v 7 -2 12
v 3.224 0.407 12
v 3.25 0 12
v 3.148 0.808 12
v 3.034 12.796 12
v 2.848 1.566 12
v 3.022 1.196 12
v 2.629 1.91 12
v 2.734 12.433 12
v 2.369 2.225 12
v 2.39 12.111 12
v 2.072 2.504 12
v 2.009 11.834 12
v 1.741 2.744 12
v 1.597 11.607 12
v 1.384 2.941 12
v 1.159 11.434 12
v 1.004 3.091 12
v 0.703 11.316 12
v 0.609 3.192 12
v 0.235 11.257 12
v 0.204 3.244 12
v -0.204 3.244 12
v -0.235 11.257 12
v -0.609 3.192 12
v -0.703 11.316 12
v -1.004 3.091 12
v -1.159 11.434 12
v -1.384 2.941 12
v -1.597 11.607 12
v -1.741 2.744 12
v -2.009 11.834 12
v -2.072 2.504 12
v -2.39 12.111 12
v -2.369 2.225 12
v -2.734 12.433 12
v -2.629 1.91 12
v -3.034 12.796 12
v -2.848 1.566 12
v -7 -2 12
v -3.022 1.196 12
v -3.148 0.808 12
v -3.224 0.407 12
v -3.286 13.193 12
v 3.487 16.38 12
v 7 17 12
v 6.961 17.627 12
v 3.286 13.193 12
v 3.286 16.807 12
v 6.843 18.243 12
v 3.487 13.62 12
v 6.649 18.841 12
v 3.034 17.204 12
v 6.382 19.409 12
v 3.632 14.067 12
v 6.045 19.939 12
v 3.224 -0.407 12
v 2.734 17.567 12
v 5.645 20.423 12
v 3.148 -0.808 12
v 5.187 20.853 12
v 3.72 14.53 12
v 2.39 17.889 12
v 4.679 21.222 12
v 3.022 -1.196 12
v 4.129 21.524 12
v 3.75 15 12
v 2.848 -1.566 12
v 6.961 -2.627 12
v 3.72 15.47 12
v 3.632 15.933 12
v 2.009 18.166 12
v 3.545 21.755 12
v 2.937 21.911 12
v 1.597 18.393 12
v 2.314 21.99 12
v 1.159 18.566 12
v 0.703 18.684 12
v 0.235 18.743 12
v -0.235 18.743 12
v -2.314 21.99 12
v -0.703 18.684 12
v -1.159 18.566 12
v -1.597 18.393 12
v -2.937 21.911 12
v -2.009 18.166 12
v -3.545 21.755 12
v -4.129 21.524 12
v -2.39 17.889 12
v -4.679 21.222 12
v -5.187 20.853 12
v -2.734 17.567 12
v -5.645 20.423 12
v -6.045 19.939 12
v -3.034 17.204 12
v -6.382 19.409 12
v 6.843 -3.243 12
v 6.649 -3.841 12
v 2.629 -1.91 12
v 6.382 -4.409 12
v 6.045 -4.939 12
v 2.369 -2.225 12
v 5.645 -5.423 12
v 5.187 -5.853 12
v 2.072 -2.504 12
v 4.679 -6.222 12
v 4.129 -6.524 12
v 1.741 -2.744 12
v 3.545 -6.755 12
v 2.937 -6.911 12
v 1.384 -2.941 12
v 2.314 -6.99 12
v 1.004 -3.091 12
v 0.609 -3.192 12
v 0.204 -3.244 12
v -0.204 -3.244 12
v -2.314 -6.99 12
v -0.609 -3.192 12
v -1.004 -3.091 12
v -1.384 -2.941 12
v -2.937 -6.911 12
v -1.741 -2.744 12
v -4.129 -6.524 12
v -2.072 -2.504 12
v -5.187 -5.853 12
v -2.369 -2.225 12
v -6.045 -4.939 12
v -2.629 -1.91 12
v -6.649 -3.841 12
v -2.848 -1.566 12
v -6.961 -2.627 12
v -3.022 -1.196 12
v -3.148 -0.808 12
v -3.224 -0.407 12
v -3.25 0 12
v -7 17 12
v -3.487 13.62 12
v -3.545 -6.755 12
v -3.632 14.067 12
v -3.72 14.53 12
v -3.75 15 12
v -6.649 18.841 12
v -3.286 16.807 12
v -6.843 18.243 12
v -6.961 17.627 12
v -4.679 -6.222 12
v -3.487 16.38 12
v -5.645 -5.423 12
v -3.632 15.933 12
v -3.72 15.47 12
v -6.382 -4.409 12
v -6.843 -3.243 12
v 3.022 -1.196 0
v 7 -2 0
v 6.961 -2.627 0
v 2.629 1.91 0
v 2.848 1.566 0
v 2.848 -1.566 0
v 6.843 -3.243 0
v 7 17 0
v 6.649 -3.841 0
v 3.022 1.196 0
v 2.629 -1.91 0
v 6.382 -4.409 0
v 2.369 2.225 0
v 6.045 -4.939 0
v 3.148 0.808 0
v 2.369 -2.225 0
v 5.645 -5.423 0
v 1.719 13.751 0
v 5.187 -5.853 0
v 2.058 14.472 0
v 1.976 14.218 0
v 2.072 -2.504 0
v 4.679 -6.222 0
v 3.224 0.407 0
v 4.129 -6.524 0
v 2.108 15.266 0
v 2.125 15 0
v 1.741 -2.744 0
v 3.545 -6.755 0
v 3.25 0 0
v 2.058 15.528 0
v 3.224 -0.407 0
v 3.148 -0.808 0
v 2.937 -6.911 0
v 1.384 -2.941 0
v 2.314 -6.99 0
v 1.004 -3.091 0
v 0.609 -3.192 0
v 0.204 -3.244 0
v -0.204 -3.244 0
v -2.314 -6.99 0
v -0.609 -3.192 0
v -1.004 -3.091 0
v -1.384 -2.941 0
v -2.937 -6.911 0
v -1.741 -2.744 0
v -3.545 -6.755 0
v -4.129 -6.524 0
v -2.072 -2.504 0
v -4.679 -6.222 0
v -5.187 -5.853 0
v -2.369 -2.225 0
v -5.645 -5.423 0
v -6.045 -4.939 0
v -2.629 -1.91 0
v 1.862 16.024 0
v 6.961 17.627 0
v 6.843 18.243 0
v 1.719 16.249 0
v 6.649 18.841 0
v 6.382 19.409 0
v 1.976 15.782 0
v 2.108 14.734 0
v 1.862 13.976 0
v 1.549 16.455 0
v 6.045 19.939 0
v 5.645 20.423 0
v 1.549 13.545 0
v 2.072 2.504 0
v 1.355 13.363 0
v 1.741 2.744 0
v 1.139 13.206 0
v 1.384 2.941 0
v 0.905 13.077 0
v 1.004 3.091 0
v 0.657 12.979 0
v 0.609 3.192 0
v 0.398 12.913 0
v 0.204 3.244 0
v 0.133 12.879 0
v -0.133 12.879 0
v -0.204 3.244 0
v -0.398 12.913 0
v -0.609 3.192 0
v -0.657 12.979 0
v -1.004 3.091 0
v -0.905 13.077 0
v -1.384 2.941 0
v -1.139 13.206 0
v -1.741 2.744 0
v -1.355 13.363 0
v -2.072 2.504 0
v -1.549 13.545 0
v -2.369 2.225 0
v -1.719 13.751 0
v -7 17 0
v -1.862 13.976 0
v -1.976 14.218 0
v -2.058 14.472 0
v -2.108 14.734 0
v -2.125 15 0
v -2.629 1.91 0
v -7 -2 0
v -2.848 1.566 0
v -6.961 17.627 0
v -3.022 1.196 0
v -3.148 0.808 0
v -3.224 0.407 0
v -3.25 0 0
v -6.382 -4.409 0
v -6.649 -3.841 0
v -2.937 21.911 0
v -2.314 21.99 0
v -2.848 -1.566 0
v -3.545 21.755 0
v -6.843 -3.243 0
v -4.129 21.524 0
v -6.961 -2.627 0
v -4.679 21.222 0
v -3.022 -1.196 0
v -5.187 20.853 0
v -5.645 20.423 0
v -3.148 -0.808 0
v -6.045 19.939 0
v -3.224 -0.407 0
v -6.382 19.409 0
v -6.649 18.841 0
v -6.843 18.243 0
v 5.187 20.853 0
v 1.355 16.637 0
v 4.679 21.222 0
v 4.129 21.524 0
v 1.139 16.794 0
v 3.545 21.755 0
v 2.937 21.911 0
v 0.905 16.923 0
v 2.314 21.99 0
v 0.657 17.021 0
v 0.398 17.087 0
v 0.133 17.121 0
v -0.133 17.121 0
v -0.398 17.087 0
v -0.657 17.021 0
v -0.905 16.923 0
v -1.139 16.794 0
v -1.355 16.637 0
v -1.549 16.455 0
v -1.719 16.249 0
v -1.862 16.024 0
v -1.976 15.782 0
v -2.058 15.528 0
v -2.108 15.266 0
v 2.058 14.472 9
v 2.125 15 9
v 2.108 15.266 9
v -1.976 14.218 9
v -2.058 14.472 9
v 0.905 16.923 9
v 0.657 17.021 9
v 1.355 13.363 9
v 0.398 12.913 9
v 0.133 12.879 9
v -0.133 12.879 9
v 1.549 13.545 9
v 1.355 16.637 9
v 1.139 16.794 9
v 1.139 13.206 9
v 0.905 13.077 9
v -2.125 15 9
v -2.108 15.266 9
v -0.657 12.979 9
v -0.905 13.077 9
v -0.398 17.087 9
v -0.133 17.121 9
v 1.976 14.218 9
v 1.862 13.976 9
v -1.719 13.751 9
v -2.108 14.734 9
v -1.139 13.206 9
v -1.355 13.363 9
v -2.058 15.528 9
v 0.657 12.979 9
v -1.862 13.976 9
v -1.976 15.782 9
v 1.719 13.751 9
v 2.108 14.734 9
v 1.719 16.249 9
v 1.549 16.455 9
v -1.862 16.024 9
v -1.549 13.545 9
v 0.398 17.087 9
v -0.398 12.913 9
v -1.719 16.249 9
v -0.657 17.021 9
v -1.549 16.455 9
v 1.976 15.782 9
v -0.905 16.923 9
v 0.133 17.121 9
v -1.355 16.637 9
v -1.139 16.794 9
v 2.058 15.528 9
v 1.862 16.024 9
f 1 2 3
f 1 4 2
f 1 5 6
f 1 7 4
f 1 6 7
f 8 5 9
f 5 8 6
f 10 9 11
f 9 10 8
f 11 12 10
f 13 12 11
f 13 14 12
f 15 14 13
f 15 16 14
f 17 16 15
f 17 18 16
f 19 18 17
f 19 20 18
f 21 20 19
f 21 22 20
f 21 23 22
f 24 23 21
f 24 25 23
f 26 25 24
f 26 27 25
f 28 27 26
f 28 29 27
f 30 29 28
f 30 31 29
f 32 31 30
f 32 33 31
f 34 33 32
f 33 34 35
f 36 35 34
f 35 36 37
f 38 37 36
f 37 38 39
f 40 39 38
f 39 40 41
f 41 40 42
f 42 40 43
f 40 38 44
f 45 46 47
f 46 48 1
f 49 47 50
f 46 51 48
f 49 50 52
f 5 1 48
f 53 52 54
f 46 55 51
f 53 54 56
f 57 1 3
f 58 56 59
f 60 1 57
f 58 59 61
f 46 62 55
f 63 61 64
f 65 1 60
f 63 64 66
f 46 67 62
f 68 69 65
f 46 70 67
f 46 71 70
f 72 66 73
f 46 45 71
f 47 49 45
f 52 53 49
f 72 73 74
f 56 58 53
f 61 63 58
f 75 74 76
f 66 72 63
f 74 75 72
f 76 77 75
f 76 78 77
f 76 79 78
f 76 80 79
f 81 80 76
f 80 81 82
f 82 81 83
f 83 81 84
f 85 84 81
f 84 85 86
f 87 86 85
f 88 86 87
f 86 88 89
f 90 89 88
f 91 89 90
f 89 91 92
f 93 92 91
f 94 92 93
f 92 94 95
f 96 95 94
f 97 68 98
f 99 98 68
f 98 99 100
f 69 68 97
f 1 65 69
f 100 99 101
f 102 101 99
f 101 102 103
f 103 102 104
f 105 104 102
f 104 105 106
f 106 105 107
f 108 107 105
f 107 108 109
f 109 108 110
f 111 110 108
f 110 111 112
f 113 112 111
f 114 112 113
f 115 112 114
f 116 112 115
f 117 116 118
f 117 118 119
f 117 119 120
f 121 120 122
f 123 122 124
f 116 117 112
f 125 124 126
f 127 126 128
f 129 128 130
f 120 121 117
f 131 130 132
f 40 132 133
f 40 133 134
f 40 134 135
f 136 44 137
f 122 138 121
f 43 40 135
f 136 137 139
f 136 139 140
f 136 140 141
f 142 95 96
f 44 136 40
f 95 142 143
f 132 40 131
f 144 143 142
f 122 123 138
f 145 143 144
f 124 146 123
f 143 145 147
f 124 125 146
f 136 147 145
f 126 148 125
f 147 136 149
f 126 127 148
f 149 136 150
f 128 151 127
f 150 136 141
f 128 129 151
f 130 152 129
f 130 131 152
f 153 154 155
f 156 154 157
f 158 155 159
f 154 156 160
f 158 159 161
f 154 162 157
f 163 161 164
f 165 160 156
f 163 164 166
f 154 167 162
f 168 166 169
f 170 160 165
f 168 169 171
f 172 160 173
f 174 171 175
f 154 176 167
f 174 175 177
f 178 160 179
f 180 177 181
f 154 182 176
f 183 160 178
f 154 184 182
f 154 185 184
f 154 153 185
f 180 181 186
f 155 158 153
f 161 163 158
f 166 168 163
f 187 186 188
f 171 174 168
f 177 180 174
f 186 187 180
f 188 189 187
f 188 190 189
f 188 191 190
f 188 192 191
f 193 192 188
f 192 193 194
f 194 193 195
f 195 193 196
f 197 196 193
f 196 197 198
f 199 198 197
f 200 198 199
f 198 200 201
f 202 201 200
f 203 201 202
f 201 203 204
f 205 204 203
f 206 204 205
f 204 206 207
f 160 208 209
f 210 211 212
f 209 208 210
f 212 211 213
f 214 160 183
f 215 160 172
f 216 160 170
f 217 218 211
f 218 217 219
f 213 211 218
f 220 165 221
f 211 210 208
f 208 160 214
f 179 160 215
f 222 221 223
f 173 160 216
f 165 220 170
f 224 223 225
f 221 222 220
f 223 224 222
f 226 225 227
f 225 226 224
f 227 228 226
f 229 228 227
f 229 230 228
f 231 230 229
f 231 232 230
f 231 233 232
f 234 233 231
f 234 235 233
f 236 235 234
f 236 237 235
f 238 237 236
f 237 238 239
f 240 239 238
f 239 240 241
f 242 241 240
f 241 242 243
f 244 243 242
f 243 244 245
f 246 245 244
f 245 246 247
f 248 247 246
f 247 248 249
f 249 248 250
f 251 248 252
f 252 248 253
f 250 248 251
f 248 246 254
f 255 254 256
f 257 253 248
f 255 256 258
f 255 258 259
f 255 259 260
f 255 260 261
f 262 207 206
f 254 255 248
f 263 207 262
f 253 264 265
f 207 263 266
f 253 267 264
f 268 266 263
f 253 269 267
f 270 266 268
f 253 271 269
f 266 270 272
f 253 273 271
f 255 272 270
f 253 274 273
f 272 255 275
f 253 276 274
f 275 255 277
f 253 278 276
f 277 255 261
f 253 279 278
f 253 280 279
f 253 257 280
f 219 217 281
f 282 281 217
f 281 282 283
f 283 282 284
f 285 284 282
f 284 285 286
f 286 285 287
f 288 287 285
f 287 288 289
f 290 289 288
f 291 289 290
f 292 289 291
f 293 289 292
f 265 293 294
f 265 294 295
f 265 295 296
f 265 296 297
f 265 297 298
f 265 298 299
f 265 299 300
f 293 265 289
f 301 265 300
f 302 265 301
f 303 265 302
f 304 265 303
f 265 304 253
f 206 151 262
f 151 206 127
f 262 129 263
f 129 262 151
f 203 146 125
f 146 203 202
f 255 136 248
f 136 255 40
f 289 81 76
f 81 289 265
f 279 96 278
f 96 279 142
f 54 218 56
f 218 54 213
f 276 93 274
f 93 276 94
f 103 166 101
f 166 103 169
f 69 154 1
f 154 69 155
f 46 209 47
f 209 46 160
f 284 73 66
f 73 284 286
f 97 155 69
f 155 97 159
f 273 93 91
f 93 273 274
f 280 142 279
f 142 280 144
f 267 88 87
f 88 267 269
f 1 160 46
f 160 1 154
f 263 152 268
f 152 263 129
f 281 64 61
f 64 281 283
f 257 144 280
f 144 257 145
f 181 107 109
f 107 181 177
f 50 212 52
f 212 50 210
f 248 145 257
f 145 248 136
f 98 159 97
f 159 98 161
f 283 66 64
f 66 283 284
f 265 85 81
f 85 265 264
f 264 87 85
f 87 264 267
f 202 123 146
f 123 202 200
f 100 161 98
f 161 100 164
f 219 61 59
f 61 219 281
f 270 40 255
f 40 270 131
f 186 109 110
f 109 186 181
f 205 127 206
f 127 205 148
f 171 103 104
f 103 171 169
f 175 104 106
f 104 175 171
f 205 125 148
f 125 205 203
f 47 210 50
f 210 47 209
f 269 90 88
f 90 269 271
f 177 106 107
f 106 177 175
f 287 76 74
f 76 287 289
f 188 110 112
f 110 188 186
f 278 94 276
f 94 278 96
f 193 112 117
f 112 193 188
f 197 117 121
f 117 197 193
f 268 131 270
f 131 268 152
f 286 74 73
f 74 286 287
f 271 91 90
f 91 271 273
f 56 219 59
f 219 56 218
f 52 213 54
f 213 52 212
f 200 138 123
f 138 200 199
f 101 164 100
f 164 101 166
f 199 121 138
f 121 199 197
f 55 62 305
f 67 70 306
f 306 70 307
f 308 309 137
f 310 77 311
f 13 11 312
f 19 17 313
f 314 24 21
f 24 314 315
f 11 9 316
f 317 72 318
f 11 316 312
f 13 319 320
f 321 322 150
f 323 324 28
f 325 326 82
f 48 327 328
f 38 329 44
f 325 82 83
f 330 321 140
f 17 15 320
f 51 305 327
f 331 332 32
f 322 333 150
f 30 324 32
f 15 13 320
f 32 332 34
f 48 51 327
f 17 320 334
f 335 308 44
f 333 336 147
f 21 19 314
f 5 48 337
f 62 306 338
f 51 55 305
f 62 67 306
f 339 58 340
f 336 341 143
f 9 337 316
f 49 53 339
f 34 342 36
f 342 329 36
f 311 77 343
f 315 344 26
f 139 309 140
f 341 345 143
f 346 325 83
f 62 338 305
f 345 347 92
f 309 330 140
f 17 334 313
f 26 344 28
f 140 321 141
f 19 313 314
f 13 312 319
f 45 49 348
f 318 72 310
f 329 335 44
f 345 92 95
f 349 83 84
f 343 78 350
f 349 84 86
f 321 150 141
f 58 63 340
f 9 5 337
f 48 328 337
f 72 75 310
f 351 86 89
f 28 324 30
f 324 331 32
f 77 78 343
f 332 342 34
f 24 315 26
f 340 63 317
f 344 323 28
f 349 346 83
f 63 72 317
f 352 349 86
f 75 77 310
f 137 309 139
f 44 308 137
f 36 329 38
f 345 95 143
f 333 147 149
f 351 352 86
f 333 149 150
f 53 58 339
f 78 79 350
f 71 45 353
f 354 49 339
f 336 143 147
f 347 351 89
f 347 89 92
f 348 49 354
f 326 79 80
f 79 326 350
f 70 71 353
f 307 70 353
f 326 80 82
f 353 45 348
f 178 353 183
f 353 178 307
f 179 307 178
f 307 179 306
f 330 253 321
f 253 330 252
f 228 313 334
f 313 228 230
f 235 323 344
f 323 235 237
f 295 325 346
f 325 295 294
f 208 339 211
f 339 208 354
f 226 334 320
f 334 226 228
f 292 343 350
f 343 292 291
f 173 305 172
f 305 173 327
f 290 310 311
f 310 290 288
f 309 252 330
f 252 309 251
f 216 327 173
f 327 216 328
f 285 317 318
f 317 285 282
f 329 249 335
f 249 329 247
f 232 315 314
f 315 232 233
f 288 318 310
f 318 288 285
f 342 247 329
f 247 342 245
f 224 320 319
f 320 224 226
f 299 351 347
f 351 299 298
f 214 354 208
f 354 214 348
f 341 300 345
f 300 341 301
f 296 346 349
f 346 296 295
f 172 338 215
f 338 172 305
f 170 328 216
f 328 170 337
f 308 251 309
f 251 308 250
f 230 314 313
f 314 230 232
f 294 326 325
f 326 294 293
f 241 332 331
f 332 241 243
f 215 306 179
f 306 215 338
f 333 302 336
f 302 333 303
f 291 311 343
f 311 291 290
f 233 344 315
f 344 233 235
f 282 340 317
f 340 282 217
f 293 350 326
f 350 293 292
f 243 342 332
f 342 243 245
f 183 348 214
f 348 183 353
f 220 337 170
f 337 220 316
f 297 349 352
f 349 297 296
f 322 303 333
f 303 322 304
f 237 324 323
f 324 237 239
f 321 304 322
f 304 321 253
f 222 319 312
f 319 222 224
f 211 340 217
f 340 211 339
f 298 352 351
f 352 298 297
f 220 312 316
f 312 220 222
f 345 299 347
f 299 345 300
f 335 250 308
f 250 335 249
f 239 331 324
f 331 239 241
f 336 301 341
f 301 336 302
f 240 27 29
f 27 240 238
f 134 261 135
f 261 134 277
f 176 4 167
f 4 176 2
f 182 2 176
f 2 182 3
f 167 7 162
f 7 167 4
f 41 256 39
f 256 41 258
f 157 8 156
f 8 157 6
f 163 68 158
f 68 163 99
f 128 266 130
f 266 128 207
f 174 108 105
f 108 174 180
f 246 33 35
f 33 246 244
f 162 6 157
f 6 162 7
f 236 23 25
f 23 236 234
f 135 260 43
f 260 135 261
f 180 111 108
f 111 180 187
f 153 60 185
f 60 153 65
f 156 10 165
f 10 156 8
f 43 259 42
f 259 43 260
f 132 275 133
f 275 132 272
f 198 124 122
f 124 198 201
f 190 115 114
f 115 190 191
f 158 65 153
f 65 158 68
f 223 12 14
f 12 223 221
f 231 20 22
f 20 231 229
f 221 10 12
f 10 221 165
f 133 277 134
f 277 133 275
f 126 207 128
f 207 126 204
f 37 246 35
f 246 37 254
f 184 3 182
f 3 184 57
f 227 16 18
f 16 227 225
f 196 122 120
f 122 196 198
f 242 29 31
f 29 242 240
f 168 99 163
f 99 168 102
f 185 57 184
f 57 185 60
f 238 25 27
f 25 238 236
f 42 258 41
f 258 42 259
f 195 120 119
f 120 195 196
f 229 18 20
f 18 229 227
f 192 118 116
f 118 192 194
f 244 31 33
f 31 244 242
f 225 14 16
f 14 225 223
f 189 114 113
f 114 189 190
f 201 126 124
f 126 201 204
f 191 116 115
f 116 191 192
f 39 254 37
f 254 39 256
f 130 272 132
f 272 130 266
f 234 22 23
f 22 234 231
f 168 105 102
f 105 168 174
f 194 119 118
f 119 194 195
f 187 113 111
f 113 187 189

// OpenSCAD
$fn = 50;


difference() {
	union() {
		cylinder(h = 12, r = 7.0000000000);
		translate(v = [0.0000000000, 7.5000000000, 0]) {
			hull() {
				translate(v = [-2.0000000000, 9.5000000000, 0]) {
					cylinder(h = 12, r = 5);
				}
				translate(v = [2.0000000000, 9.5000000000, 0]) {
					cylinder(h = 12, r = 5);
				}
				translate(v = [-2.0000000000, -9.5000000000, 0]) {
					cylinder(h = 12, r = 5);
				}
				translate(v = [2.0000000000, -9.5000000000, 0]) {
					cylinder(h = 12, r = 5);
				}
			}
		}
		translate(v = [0.0000000000, 7.5000000000, 0]) {
			hull() {
				translate(v = [-2.0000000000, 9.5000000000, 0]) {
					cylinder(h = 12, r = 5);
				}
				translate(v = [2.0000000000, 9.5000000000, 0]) {
					cylinder(h = 12, r = 5);
				}
				translate(v = [-2.0000000000, -9.5000000000, 0]) {
					cylinder(h = 12, r = 5);
				}
				translate(v = [2.0000000000, -9.5000000000, 0]) {
					cylinder(h = 12, r = 5);
				}
			}
		}
	}
	union() {
		translate(v = [0.0000000000, 15.0000000000, 12]) {
			rotate(a = [0, 0, 0]) {
				difference() {
					union() {
						#translate(v = [0, 0, -12.0000000000]) {
							cylinder(h = 12, r = 2.0000000000);
						}
						#translate(v = [0, 0, -3]) {
							cylinder(h = 3, r1 = 2.1250000000, r2 = 3.7500000000);
						}
						#translate(v = [0, 0, -12.0000000000]) {
							cylinder(h = 12, r = 2.1250000000);
						}
						#translate(v = [0, 0, -12.0000000000]) {
							cylinder(h = 12, r = 2.0000000000);
						}
					}
					union();
				}
			}
		}
		translate(v = [0.0000000000, 15.0000000000, 12]) {
			rotate(a = [0, 0, 0]) {
				difference() {
					union() {
						#translate(v = [0, 0, -12.0000000000]) {
							cylinder(h = 12, r = 2.0000000000);
						}
						#translate(v = [0, 0, -3]) {
							cylinder(h = 3, r1 = 2.1250000000, r2 = 3.7500000000);
						}
						#translate(v = [0, 0, -12.0000000000]) {
							cylinder(h = 12, r = 2.1250000000);
						}
						#translate(v = [0, 0, -12.0000000000]) {
							cylinder(h = 12, r = 2.0000000000);
						}
					}
					union();
				}
			}
		}
		translate(v = [0, 0, -100]) {
			cylinder(h = 200, r = 3.2500000000);
		}
		translate(v = [0, 0, -100]) {
			cylinder(h = 200, r = 1.8000000000);
		}
	}
}
